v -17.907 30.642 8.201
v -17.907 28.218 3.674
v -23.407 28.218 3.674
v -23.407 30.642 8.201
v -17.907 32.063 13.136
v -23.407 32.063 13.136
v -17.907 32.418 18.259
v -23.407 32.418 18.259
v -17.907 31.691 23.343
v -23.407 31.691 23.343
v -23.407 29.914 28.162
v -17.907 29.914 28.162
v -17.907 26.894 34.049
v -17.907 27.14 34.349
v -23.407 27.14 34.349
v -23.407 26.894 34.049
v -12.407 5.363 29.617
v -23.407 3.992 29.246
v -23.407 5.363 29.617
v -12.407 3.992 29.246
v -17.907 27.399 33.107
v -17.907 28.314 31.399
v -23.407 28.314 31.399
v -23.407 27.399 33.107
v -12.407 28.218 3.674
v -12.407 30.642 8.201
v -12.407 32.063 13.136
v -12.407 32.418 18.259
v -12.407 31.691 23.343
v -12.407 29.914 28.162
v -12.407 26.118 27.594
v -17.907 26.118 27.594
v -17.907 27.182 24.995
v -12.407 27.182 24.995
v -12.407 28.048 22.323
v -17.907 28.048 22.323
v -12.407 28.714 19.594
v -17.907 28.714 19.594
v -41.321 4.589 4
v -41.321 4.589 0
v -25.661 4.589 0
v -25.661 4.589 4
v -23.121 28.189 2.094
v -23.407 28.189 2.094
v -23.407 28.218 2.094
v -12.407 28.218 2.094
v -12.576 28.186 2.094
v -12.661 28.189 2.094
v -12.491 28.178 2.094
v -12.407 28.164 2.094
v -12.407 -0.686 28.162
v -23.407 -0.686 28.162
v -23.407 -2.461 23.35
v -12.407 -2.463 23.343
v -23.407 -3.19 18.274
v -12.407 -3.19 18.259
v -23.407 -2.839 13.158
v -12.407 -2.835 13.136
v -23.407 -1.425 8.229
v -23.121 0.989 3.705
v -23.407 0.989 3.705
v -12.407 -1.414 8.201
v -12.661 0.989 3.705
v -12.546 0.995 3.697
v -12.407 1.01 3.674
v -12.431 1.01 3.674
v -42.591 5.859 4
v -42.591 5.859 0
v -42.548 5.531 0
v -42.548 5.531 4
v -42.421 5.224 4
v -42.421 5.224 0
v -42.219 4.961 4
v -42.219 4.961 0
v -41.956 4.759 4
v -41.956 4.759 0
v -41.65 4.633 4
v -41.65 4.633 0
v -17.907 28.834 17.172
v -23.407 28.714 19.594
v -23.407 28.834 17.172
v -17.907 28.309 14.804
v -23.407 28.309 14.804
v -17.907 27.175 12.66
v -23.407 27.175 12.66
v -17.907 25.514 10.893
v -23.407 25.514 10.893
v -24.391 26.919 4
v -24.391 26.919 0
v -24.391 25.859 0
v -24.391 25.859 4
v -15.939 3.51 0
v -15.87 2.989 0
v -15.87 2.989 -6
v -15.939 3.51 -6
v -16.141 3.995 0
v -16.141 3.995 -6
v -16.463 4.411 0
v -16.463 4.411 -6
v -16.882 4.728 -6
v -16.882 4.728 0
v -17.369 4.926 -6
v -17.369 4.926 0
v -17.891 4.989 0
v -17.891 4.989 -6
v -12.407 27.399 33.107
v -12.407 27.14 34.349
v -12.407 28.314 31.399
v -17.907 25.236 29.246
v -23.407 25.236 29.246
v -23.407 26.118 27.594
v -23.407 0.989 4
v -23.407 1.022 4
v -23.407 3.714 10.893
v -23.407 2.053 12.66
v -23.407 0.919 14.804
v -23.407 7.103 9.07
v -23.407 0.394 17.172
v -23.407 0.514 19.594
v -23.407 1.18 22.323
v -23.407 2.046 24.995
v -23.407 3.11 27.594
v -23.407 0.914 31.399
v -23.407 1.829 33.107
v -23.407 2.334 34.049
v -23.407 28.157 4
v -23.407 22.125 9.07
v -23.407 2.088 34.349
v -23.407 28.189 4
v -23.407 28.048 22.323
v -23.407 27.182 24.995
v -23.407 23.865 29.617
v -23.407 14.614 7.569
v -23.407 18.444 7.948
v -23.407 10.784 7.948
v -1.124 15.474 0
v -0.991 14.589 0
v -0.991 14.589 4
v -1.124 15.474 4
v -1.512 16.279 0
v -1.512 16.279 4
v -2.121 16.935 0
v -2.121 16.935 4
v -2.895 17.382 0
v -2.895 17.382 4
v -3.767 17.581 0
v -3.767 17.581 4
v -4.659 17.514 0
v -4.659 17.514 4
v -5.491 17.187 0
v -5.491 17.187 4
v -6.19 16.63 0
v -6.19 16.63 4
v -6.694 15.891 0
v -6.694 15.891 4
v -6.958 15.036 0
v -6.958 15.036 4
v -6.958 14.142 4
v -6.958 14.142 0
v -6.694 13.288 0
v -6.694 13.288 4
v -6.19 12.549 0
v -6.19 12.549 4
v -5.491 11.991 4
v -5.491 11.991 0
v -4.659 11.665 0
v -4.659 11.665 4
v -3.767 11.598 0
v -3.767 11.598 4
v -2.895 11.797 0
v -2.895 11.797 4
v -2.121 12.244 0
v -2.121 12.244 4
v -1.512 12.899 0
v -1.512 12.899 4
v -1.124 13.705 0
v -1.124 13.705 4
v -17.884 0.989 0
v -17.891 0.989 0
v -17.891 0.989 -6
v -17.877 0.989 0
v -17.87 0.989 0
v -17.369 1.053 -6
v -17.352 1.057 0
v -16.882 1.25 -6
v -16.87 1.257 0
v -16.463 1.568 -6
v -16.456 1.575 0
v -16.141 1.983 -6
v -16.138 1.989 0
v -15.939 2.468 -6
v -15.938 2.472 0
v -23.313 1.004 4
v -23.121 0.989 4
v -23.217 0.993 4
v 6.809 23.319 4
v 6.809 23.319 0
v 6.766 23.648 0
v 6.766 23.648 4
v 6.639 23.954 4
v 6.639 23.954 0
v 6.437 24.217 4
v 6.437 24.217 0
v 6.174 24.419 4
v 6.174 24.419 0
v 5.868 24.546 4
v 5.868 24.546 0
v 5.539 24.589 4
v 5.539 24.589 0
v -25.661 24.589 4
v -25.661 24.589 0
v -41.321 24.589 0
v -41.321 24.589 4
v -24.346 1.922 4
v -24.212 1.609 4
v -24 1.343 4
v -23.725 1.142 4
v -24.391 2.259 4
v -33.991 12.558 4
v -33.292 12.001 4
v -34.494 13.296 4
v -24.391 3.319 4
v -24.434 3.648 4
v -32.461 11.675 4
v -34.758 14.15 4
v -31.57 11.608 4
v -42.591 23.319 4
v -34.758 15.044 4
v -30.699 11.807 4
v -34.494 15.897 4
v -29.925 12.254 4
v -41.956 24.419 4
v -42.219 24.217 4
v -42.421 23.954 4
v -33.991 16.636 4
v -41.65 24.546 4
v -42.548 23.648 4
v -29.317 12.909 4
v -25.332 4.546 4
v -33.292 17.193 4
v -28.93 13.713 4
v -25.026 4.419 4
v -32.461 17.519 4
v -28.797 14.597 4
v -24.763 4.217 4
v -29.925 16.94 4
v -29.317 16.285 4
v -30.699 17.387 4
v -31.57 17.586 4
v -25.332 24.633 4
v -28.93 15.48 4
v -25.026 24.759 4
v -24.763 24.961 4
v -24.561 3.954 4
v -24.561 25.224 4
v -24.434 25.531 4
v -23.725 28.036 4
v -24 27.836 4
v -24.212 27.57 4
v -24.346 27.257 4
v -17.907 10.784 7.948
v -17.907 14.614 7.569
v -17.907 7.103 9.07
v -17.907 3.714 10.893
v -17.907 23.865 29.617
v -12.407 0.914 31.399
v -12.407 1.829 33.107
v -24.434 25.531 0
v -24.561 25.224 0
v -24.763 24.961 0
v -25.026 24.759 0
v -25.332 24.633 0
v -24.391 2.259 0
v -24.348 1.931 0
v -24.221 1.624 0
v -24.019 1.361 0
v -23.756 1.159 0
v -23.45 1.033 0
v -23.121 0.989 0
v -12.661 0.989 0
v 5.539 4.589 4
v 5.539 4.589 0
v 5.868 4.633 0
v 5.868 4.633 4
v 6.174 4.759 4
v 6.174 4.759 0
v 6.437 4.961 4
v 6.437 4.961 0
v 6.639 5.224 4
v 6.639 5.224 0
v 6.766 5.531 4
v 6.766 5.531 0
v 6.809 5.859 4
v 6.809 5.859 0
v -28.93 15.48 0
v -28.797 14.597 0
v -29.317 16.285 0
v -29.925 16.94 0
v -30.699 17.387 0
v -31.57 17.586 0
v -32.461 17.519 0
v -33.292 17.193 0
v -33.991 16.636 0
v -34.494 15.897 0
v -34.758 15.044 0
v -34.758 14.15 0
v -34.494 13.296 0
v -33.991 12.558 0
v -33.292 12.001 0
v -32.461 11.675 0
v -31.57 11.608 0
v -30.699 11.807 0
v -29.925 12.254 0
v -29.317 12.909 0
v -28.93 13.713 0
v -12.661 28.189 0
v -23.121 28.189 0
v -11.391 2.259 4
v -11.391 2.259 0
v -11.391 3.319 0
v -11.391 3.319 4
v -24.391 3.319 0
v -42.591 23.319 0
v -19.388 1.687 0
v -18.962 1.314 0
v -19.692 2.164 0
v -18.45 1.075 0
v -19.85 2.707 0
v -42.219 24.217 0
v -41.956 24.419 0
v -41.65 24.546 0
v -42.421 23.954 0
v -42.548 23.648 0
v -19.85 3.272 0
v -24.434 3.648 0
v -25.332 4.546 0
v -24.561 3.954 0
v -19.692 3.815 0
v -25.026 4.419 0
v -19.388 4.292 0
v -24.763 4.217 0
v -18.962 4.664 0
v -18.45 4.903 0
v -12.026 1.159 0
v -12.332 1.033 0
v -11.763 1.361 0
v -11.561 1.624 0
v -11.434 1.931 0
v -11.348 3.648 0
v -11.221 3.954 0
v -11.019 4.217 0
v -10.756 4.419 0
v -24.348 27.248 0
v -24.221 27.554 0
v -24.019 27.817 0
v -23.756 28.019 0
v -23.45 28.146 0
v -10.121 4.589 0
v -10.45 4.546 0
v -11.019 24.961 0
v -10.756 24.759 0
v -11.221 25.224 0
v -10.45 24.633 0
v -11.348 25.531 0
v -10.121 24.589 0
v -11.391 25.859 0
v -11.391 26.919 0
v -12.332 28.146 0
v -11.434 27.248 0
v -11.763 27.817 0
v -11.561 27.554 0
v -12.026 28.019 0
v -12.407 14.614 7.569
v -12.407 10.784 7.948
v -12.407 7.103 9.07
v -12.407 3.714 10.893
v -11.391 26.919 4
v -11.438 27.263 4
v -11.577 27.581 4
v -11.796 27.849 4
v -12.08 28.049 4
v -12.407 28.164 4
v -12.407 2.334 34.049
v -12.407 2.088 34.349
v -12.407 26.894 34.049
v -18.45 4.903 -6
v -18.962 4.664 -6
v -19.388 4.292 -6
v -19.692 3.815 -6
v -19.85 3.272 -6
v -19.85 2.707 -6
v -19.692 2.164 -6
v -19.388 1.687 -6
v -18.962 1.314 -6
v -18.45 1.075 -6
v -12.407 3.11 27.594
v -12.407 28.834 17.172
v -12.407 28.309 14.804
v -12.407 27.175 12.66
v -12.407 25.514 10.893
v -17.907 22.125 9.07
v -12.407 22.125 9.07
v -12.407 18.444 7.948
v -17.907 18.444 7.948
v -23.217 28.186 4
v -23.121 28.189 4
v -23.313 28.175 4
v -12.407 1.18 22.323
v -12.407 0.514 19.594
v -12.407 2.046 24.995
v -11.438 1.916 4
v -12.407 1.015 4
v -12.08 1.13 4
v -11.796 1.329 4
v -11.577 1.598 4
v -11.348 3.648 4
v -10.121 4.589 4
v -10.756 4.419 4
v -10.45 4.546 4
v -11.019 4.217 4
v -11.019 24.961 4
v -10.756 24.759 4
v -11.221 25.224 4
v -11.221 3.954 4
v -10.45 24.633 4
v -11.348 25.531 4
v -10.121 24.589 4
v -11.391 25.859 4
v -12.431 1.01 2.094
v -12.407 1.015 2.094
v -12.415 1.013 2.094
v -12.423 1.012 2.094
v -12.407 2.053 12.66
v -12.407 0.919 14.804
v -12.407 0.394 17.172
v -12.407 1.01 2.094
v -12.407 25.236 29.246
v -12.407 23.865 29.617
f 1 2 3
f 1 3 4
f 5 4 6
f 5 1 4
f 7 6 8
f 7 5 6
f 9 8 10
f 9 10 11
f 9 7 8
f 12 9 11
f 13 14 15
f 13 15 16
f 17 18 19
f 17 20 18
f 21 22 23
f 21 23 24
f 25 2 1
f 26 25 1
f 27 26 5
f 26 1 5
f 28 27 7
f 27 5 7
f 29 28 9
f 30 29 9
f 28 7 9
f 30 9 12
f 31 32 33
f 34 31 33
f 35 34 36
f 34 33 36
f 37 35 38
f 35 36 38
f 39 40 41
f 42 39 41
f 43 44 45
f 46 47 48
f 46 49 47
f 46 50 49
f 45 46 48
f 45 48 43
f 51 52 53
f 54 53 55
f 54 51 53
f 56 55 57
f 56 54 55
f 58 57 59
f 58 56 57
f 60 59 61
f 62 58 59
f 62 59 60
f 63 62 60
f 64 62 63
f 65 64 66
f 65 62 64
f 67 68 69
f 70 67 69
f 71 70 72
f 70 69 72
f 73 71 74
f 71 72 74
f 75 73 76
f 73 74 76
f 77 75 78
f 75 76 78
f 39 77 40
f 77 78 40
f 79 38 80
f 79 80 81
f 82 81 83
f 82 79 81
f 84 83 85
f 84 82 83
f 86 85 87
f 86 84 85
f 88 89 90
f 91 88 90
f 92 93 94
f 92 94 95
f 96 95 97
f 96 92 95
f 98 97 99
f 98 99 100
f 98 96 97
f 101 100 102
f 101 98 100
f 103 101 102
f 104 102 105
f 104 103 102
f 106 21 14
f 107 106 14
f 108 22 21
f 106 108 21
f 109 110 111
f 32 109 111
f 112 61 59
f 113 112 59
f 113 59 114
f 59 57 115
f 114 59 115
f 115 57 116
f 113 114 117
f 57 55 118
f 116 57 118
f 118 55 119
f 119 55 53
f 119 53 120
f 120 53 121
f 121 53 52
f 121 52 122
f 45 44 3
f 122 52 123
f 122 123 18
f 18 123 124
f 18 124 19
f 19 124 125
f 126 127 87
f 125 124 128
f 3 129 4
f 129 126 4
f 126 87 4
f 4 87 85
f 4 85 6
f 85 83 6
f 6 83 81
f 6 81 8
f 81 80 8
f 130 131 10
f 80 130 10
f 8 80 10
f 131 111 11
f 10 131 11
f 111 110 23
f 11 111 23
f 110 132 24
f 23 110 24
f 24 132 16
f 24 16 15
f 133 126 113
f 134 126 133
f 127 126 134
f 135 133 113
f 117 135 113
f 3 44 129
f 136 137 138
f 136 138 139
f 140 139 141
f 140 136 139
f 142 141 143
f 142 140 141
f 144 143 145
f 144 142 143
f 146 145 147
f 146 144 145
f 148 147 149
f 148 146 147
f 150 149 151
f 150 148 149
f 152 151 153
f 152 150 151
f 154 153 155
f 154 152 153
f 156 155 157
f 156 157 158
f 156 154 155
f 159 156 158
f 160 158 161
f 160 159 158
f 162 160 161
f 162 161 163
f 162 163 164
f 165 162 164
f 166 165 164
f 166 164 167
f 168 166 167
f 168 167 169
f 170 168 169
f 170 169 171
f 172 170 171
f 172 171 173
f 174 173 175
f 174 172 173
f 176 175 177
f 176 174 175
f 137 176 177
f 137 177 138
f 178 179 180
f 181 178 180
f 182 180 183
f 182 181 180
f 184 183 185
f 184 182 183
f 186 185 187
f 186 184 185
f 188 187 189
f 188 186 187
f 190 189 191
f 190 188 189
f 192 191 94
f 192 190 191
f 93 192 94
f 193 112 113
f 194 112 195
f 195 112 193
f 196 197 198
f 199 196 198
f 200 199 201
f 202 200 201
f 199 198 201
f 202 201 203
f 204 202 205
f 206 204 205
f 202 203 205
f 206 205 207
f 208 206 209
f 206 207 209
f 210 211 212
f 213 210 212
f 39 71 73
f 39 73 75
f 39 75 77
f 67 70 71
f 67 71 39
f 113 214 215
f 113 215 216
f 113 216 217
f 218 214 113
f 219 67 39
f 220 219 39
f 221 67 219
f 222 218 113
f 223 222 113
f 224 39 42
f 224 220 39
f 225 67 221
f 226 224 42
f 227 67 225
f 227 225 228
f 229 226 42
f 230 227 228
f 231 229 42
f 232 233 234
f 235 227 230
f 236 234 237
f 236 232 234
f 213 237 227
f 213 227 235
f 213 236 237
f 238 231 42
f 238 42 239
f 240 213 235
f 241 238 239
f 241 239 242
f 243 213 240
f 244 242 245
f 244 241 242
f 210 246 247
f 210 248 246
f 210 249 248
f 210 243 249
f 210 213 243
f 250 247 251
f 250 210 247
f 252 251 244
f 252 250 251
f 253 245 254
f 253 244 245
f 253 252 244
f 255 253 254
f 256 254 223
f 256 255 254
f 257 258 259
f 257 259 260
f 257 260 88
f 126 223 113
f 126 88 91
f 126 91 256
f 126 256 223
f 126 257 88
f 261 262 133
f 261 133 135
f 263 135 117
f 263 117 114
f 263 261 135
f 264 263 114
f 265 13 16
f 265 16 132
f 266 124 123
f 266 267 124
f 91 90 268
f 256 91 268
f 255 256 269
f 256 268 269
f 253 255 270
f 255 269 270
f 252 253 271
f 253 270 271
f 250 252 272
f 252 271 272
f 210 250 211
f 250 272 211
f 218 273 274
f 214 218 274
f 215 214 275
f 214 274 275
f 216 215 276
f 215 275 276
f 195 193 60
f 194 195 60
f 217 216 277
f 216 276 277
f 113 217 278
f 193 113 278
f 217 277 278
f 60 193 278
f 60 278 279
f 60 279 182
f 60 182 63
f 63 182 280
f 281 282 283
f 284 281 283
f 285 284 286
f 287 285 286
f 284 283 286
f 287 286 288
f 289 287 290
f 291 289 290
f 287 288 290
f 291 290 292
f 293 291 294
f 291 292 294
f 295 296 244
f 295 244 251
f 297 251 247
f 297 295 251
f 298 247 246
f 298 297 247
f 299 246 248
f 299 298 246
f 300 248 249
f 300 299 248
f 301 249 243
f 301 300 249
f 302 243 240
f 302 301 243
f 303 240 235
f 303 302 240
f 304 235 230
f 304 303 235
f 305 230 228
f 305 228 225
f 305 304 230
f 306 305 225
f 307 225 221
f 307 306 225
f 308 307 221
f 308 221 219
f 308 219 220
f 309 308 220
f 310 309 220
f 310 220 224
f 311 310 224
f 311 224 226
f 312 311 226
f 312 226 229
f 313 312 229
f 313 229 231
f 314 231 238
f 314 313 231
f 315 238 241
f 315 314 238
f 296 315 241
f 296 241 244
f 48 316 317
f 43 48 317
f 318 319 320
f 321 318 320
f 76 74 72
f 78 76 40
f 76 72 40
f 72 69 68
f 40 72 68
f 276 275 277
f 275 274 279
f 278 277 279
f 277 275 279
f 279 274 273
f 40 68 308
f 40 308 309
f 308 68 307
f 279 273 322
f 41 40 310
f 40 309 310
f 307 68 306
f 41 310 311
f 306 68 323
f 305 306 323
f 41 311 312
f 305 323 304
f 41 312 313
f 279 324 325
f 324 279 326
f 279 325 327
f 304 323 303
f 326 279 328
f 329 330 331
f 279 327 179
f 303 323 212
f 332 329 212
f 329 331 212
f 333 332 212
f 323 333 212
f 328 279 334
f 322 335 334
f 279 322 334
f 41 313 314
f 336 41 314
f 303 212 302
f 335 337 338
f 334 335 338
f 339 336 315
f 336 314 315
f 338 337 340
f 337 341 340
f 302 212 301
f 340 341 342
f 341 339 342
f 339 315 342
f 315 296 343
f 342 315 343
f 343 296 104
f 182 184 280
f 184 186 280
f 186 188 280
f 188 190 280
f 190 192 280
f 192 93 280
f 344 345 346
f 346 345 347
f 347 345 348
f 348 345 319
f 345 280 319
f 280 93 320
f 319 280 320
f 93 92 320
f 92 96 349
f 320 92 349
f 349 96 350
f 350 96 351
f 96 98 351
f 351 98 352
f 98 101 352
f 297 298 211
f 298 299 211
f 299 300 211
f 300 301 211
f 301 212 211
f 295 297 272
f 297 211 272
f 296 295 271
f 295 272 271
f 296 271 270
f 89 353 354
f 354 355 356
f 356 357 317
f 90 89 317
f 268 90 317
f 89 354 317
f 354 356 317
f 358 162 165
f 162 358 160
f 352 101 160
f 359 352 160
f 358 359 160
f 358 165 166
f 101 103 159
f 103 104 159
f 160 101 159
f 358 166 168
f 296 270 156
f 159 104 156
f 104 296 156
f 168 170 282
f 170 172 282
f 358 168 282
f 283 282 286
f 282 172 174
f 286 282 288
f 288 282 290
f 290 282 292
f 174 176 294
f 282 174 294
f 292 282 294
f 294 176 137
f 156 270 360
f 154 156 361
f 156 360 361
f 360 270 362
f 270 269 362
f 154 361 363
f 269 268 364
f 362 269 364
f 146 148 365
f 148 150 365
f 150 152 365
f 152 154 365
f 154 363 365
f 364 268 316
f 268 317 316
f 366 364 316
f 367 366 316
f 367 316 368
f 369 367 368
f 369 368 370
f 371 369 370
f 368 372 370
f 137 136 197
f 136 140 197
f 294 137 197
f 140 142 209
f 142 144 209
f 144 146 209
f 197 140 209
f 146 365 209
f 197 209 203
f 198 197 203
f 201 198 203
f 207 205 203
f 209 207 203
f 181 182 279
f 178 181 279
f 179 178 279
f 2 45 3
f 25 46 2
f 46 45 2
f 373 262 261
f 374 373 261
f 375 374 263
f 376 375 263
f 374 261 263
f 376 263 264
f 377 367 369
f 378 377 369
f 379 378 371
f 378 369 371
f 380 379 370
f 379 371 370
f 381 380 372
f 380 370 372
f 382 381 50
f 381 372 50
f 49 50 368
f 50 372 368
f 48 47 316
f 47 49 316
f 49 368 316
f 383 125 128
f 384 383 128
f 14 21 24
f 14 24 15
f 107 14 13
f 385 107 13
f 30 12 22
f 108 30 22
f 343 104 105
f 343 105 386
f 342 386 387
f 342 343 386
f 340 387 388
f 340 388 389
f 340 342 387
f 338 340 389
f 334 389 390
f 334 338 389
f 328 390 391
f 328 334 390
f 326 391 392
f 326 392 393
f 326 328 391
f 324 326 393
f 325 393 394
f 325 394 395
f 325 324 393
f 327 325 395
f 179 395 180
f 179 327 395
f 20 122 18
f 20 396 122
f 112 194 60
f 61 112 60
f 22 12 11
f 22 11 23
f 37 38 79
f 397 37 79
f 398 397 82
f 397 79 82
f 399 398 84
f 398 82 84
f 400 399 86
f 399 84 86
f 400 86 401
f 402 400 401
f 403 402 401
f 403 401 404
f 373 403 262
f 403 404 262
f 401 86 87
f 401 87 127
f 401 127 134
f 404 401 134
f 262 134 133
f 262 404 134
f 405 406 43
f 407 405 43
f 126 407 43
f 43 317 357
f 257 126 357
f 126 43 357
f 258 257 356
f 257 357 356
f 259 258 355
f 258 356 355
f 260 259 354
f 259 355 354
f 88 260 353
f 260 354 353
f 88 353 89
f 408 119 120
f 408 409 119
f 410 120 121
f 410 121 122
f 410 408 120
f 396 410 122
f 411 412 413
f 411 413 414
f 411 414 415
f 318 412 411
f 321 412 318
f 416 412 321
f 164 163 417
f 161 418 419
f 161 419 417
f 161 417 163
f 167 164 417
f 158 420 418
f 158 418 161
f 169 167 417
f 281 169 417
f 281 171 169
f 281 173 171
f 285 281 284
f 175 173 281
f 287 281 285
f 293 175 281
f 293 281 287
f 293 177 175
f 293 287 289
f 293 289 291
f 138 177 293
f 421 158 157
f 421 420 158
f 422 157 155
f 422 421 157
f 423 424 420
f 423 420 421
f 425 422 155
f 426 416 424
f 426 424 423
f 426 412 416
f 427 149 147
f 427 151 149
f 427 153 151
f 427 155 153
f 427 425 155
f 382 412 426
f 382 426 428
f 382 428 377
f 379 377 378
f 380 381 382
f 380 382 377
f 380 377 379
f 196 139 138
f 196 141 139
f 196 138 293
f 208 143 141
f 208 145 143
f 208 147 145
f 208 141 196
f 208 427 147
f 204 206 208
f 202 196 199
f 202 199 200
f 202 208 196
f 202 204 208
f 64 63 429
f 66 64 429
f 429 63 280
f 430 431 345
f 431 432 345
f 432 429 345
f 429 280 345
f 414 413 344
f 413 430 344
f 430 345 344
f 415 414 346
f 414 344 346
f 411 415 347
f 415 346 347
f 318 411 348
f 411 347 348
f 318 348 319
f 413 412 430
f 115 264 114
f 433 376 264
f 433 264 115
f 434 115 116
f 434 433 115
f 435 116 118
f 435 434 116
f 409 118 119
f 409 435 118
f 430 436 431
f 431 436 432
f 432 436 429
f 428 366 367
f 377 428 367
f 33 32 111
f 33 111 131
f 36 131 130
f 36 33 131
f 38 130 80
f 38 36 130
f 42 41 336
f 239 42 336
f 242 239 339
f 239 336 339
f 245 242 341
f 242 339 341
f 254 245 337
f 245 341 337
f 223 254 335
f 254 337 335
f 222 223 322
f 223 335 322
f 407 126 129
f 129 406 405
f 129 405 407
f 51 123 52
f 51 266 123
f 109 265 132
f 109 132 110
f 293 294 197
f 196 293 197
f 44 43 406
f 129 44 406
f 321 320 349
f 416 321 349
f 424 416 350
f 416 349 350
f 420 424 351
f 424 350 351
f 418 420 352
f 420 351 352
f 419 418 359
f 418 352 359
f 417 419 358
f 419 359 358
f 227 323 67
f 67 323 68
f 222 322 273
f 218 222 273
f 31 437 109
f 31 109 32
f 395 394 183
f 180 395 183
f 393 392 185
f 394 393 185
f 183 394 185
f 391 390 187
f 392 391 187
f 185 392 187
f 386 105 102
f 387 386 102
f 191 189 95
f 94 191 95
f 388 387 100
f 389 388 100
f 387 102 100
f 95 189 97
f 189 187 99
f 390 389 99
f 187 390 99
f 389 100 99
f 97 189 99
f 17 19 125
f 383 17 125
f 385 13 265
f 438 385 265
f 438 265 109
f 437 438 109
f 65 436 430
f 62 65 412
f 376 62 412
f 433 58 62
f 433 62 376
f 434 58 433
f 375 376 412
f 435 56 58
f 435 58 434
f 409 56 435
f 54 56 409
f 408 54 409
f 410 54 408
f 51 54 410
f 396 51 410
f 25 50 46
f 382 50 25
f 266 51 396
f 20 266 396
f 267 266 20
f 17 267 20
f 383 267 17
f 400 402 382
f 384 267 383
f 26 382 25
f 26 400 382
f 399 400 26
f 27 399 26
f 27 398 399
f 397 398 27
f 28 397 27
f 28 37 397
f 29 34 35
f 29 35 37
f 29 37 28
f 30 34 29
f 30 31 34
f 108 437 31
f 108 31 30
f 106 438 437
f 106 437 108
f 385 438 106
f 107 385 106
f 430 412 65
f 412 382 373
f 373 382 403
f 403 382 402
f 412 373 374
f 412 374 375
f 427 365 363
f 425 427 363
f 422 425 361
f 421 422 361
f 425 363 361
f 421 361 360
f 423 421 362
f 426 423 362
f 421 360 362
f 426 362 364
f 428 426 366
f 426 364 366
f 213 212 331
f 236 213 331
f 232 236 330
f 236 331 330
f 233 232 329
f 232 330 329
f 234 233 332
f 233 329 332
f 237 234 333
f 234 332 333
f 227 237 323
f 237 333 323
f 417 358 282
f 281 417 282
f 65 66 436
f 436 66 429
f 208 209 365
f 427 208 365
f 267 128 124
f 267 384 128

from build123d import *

# Parameters (mm, degrees)
F0_R     = 2.9972
F0_R_2   = 3
F1_DEPTH = 4
F4_DEPTH = 5.5
F5_DEPTH = 5.5
F7_DEPTH = 6


with BuildPart() as f1:
    # F0 (on Top) → F1 (new body)
    with BuildSketch(Plane.XY):
        with BuildLine():
            Line((-25.6610898641, 24.5893044506), (-41.3210898641, 24.5893044506))
            ThreePointArc((-41.3210898641, 24.5893044506), (-42.2191154762, 24.2173300627), (-42.5910898641, 23.3193044506))
            Line((-42.5910898641, 23.3193044506), (-42.5910898641, 5.8593044506))
            ThreePointArc((-42.5910898641, 5.8593044506), (-42.2191154762, 4.9612788385), (-41.3210898641, 4.5893044506))
            Line((-41.3210898641, 4.5893044506), (-25.6610898641, 4.5893044506))
            ThreePointArc((-25.6610898641, 4.5893044506), (-24.763064252, 4.2173300627), (-24.3910898641, 3.3193044506))
            Line((-24.3910898641, 3.3193044506), (-24.3910898641, 2.2593044506))
            ThreePointArc((-24.3910898641, 2.2593044506), (-24.0191154762, 1.3612788385), (-23.1210898641, 0.9893044506))
            Line((-23.1210898641, 0.9893044506), (-17.8910898641, 0.9893044506))
            Line((-17.8910898641, 0.9893044506), (-17.8910898641, 28.1893044506))
            Line((-17.8910898641, 28.1893044506), (-23.1210898641, 28.1893044506))
            ThreePointArc((-23.1210898641, 28.1893044506), (-24.0191154762, 27.8173300627), (-24.3910898641, 26.9193044506))
            Line((-24.3910898641, 26.9193044506), (-24.3910898641, 25.8593044506))
            ThreePointArc((-24.3910898641, 25.8593044506), (-24.763064252, 24.9612788385), (-25.6610898641, 24.5893044506))
        make_face()
        with Locations((-31.7938898641, 14.5969044506)):
            Circle(F0_R, mode=Mode.SUBTRACT)
        with BuildLine():
            Line((-12.6610898641, 28.1893044506), (-17.8910898641, 28.1893044506))
            Line((-17.8910898641, 28.1893044506), (-17.8910898641, 0.9893044506))
            Line((-17.8910898641, 0.9893044506), (-12.6610898641, 0.9893044506))
            ThreePointArc((-12.6610898641, 0.9893044506), (-11.763064252, 1.3612788385), (-11.3910898641, 2.2593044506))
            Line((-11.3910898641, 2.2593044506), (-11.3910898641, 3.3193044506))
            ThreePointArc((-11.3910898641, 3.3193044506), (-11.0191154762, 4.2173300627), (-10.1210898641, 4.5893044506))
            Line((-10.1210898641, 4.5893044506), (5.5389101359, 4.5893044506))
            ThreePointArc((5.5389101359, 4.5893044506), (6.436935748, 4.9612788385), (6.8089101359, 5.8593044506))
            Line((6.8089101359, 5.8593044506), (6.8089101359, 23.3193044506))
            ThreePointArc((6.8089101359, 23.3193044506), (6.436935748, 24.2173300627), (5.5389101359, 24.5893044506))
            Line((5.5389101359, 24.5893044506), (-10.1210898641, 24.5893044506))
            ThreePointArc((-10.1210898641, 24.5893044506), (-11.0191154762, 24.9612788385), (-11.3910898641, 25.8593044506))
            Line((-11.3910898641, 25.8593044506), (-11.3910898641, 26.9193044506))
            ThreePointArc((-11.3910898641, 26.9193044506), (-11.763064252, 27.8173300627), (-12.6610898641, 28.1893044506))
        make_face()
        with Locations((-3.9910898641, 14.5893044506)):
            Circle(F0_R_2, mode=Mode.SUBTRACT)
    extrude(amount=F1_DEPTH)

    # F3 (on offset) → F4 (join)
    with BuildSketch(Plane.YZ.offset(-17.907)):
        with BuildLine():
            Line((1.0103175882, 3.6736566108), (1.0103175882, 2.094399018))
            Line((1.0103175882, 2.094399018), (14.6140140714, 2.094399018))
            Line((14.6140140714, 2.094399018), (14.6140140714, 7.5688682606))
            ThreePointArc((14.6140140714, 7.5688682606), (8.9162605334, 8.4182832346), (3.7140140714, 10.8926584944))
            ThreePointArc((3.7140140714, 10.8926584944), (0.9193465512, 14.8041987102), (0.5140140714, 19.594399018))
            ThreePointArc((0.5140140714, 19.594399018), (1.5880995617, 23.6670004727), (3.1097049359, 27.594399018))
            Line((3.1097049359, 27.594399018), (3.9924437818, 29.2461096572))
            Line((3.9924437818, 29.2461096572), (5.3628443275, 29.6174231917))
            Line((5.3628443275, 29.6174231917), (2.3336572567, 34.0493805554))
            Line((2.3336572567, 34.0493805554), (2.0878820214, 34.3491211534))
            Line((2.0878820214, 34.3491211534), (1.8287835856, 33.1069578199))
            Line((1.8287835856, 33.1069578199), (0.9140140714, 31.3994027674))
            Line((0.9140140714, 31.3994027674), (-0.6859859286, 28.1615126878))
            ThreePointArc((-0.6859859286, 28.1615126878), (-3.1482462474, 15.6882683861), (1.0103175882, 3.6736566108))
        make_face()
        with BuildLine():
            Line((14.6140140714, 7.5688682606), (14.6140140714, 2.094399018))
            Line((14.6140140714, 2.094399018), (28.2177105546, 2.094399018))
            Line((28.2177105546, 2.094399018), (28.2177105546, 3.6736566108))
            ThreePointArc((28.2177105546, 3.6736566108), (32.3762743902, 15.6882683861), (29.9140140714, 28.1615126878))
            Line((29.9140140714, 28.1615126878), (28.3140140714, 31.3994027674))
            Line((28.3140140714, 31.3994027674), (27.3992445572, 33.1069578199))
            Line((27.3992445572, 33.1069578199), (27.1401461214, 34.3491211534))
            Line((27.1401461214, 34.3491211534), (26.8943708861, 34.0493805554))
            Line((26.8943708861, 34.0493805554), (23.8651838154, 29.6174231917))
            Line((23.8651838154, 29.6174231917), (25.2355843611, 29.2461096572))
            Line((25.2355843611, 29.2461096572), (26.1183232069, 27.594399018))
            ThreePointArc((26.1183232069, 27.594399018), (27.6399285811, 23.6670004727), (28.7140140714, 19.594399018))
            ThreePointArc((28.7140140714, 19.594399018), (28.3086815916, 14.8041987102), (25.5140140714, 10.8926584944))
            ThreePointArc((25.5140140714, 10.8926584944), (20.3117676094, 8.4182832346), (14.6140140714, 7.5688682606))
        make_face()
    extrude(amount=F4_DEPTH)

    # F5 (add): a face of the model
    f5_faces = [f1.faces().sort_by_distance(p)[0] for p in [
        (-17.907, 0.5449617654, 29.5675053748),
    ]]
    extrude(f5_faces, amount=F5_DEPTH)

    # F6 (on face) → F7 (join)
    with BuildSketch(Plane.XY):
        with BuildLine():
            ThreePointArc((-17.8910898641, 0.9894171115), (-16.4631735111, 1.5676054433), (-15.8698617965, 2.9893044506))
            ThreePointArc((-15.8698617965, 2.9893044506), (-16.4631735111, 4.411003458), (-17.8910898641, 4.9891917898))
            Line((-17.8910898641, 4.9891917898), (-17.8910898641, 0.9894171115))
        make_face()
        with BuildLine():
            Line((-17.8910898641, 0.9894171115), (-17.8910898641, 4.9891917898))
            ThreePointArc((-17.8910898641, 4.9891917898), (-19.8698617965, 2.9893044506), (-17.8910898641, 0.9894171115))
        make_face()
    extrude(amount=-F7_DEPTH)


solid = f1.part
